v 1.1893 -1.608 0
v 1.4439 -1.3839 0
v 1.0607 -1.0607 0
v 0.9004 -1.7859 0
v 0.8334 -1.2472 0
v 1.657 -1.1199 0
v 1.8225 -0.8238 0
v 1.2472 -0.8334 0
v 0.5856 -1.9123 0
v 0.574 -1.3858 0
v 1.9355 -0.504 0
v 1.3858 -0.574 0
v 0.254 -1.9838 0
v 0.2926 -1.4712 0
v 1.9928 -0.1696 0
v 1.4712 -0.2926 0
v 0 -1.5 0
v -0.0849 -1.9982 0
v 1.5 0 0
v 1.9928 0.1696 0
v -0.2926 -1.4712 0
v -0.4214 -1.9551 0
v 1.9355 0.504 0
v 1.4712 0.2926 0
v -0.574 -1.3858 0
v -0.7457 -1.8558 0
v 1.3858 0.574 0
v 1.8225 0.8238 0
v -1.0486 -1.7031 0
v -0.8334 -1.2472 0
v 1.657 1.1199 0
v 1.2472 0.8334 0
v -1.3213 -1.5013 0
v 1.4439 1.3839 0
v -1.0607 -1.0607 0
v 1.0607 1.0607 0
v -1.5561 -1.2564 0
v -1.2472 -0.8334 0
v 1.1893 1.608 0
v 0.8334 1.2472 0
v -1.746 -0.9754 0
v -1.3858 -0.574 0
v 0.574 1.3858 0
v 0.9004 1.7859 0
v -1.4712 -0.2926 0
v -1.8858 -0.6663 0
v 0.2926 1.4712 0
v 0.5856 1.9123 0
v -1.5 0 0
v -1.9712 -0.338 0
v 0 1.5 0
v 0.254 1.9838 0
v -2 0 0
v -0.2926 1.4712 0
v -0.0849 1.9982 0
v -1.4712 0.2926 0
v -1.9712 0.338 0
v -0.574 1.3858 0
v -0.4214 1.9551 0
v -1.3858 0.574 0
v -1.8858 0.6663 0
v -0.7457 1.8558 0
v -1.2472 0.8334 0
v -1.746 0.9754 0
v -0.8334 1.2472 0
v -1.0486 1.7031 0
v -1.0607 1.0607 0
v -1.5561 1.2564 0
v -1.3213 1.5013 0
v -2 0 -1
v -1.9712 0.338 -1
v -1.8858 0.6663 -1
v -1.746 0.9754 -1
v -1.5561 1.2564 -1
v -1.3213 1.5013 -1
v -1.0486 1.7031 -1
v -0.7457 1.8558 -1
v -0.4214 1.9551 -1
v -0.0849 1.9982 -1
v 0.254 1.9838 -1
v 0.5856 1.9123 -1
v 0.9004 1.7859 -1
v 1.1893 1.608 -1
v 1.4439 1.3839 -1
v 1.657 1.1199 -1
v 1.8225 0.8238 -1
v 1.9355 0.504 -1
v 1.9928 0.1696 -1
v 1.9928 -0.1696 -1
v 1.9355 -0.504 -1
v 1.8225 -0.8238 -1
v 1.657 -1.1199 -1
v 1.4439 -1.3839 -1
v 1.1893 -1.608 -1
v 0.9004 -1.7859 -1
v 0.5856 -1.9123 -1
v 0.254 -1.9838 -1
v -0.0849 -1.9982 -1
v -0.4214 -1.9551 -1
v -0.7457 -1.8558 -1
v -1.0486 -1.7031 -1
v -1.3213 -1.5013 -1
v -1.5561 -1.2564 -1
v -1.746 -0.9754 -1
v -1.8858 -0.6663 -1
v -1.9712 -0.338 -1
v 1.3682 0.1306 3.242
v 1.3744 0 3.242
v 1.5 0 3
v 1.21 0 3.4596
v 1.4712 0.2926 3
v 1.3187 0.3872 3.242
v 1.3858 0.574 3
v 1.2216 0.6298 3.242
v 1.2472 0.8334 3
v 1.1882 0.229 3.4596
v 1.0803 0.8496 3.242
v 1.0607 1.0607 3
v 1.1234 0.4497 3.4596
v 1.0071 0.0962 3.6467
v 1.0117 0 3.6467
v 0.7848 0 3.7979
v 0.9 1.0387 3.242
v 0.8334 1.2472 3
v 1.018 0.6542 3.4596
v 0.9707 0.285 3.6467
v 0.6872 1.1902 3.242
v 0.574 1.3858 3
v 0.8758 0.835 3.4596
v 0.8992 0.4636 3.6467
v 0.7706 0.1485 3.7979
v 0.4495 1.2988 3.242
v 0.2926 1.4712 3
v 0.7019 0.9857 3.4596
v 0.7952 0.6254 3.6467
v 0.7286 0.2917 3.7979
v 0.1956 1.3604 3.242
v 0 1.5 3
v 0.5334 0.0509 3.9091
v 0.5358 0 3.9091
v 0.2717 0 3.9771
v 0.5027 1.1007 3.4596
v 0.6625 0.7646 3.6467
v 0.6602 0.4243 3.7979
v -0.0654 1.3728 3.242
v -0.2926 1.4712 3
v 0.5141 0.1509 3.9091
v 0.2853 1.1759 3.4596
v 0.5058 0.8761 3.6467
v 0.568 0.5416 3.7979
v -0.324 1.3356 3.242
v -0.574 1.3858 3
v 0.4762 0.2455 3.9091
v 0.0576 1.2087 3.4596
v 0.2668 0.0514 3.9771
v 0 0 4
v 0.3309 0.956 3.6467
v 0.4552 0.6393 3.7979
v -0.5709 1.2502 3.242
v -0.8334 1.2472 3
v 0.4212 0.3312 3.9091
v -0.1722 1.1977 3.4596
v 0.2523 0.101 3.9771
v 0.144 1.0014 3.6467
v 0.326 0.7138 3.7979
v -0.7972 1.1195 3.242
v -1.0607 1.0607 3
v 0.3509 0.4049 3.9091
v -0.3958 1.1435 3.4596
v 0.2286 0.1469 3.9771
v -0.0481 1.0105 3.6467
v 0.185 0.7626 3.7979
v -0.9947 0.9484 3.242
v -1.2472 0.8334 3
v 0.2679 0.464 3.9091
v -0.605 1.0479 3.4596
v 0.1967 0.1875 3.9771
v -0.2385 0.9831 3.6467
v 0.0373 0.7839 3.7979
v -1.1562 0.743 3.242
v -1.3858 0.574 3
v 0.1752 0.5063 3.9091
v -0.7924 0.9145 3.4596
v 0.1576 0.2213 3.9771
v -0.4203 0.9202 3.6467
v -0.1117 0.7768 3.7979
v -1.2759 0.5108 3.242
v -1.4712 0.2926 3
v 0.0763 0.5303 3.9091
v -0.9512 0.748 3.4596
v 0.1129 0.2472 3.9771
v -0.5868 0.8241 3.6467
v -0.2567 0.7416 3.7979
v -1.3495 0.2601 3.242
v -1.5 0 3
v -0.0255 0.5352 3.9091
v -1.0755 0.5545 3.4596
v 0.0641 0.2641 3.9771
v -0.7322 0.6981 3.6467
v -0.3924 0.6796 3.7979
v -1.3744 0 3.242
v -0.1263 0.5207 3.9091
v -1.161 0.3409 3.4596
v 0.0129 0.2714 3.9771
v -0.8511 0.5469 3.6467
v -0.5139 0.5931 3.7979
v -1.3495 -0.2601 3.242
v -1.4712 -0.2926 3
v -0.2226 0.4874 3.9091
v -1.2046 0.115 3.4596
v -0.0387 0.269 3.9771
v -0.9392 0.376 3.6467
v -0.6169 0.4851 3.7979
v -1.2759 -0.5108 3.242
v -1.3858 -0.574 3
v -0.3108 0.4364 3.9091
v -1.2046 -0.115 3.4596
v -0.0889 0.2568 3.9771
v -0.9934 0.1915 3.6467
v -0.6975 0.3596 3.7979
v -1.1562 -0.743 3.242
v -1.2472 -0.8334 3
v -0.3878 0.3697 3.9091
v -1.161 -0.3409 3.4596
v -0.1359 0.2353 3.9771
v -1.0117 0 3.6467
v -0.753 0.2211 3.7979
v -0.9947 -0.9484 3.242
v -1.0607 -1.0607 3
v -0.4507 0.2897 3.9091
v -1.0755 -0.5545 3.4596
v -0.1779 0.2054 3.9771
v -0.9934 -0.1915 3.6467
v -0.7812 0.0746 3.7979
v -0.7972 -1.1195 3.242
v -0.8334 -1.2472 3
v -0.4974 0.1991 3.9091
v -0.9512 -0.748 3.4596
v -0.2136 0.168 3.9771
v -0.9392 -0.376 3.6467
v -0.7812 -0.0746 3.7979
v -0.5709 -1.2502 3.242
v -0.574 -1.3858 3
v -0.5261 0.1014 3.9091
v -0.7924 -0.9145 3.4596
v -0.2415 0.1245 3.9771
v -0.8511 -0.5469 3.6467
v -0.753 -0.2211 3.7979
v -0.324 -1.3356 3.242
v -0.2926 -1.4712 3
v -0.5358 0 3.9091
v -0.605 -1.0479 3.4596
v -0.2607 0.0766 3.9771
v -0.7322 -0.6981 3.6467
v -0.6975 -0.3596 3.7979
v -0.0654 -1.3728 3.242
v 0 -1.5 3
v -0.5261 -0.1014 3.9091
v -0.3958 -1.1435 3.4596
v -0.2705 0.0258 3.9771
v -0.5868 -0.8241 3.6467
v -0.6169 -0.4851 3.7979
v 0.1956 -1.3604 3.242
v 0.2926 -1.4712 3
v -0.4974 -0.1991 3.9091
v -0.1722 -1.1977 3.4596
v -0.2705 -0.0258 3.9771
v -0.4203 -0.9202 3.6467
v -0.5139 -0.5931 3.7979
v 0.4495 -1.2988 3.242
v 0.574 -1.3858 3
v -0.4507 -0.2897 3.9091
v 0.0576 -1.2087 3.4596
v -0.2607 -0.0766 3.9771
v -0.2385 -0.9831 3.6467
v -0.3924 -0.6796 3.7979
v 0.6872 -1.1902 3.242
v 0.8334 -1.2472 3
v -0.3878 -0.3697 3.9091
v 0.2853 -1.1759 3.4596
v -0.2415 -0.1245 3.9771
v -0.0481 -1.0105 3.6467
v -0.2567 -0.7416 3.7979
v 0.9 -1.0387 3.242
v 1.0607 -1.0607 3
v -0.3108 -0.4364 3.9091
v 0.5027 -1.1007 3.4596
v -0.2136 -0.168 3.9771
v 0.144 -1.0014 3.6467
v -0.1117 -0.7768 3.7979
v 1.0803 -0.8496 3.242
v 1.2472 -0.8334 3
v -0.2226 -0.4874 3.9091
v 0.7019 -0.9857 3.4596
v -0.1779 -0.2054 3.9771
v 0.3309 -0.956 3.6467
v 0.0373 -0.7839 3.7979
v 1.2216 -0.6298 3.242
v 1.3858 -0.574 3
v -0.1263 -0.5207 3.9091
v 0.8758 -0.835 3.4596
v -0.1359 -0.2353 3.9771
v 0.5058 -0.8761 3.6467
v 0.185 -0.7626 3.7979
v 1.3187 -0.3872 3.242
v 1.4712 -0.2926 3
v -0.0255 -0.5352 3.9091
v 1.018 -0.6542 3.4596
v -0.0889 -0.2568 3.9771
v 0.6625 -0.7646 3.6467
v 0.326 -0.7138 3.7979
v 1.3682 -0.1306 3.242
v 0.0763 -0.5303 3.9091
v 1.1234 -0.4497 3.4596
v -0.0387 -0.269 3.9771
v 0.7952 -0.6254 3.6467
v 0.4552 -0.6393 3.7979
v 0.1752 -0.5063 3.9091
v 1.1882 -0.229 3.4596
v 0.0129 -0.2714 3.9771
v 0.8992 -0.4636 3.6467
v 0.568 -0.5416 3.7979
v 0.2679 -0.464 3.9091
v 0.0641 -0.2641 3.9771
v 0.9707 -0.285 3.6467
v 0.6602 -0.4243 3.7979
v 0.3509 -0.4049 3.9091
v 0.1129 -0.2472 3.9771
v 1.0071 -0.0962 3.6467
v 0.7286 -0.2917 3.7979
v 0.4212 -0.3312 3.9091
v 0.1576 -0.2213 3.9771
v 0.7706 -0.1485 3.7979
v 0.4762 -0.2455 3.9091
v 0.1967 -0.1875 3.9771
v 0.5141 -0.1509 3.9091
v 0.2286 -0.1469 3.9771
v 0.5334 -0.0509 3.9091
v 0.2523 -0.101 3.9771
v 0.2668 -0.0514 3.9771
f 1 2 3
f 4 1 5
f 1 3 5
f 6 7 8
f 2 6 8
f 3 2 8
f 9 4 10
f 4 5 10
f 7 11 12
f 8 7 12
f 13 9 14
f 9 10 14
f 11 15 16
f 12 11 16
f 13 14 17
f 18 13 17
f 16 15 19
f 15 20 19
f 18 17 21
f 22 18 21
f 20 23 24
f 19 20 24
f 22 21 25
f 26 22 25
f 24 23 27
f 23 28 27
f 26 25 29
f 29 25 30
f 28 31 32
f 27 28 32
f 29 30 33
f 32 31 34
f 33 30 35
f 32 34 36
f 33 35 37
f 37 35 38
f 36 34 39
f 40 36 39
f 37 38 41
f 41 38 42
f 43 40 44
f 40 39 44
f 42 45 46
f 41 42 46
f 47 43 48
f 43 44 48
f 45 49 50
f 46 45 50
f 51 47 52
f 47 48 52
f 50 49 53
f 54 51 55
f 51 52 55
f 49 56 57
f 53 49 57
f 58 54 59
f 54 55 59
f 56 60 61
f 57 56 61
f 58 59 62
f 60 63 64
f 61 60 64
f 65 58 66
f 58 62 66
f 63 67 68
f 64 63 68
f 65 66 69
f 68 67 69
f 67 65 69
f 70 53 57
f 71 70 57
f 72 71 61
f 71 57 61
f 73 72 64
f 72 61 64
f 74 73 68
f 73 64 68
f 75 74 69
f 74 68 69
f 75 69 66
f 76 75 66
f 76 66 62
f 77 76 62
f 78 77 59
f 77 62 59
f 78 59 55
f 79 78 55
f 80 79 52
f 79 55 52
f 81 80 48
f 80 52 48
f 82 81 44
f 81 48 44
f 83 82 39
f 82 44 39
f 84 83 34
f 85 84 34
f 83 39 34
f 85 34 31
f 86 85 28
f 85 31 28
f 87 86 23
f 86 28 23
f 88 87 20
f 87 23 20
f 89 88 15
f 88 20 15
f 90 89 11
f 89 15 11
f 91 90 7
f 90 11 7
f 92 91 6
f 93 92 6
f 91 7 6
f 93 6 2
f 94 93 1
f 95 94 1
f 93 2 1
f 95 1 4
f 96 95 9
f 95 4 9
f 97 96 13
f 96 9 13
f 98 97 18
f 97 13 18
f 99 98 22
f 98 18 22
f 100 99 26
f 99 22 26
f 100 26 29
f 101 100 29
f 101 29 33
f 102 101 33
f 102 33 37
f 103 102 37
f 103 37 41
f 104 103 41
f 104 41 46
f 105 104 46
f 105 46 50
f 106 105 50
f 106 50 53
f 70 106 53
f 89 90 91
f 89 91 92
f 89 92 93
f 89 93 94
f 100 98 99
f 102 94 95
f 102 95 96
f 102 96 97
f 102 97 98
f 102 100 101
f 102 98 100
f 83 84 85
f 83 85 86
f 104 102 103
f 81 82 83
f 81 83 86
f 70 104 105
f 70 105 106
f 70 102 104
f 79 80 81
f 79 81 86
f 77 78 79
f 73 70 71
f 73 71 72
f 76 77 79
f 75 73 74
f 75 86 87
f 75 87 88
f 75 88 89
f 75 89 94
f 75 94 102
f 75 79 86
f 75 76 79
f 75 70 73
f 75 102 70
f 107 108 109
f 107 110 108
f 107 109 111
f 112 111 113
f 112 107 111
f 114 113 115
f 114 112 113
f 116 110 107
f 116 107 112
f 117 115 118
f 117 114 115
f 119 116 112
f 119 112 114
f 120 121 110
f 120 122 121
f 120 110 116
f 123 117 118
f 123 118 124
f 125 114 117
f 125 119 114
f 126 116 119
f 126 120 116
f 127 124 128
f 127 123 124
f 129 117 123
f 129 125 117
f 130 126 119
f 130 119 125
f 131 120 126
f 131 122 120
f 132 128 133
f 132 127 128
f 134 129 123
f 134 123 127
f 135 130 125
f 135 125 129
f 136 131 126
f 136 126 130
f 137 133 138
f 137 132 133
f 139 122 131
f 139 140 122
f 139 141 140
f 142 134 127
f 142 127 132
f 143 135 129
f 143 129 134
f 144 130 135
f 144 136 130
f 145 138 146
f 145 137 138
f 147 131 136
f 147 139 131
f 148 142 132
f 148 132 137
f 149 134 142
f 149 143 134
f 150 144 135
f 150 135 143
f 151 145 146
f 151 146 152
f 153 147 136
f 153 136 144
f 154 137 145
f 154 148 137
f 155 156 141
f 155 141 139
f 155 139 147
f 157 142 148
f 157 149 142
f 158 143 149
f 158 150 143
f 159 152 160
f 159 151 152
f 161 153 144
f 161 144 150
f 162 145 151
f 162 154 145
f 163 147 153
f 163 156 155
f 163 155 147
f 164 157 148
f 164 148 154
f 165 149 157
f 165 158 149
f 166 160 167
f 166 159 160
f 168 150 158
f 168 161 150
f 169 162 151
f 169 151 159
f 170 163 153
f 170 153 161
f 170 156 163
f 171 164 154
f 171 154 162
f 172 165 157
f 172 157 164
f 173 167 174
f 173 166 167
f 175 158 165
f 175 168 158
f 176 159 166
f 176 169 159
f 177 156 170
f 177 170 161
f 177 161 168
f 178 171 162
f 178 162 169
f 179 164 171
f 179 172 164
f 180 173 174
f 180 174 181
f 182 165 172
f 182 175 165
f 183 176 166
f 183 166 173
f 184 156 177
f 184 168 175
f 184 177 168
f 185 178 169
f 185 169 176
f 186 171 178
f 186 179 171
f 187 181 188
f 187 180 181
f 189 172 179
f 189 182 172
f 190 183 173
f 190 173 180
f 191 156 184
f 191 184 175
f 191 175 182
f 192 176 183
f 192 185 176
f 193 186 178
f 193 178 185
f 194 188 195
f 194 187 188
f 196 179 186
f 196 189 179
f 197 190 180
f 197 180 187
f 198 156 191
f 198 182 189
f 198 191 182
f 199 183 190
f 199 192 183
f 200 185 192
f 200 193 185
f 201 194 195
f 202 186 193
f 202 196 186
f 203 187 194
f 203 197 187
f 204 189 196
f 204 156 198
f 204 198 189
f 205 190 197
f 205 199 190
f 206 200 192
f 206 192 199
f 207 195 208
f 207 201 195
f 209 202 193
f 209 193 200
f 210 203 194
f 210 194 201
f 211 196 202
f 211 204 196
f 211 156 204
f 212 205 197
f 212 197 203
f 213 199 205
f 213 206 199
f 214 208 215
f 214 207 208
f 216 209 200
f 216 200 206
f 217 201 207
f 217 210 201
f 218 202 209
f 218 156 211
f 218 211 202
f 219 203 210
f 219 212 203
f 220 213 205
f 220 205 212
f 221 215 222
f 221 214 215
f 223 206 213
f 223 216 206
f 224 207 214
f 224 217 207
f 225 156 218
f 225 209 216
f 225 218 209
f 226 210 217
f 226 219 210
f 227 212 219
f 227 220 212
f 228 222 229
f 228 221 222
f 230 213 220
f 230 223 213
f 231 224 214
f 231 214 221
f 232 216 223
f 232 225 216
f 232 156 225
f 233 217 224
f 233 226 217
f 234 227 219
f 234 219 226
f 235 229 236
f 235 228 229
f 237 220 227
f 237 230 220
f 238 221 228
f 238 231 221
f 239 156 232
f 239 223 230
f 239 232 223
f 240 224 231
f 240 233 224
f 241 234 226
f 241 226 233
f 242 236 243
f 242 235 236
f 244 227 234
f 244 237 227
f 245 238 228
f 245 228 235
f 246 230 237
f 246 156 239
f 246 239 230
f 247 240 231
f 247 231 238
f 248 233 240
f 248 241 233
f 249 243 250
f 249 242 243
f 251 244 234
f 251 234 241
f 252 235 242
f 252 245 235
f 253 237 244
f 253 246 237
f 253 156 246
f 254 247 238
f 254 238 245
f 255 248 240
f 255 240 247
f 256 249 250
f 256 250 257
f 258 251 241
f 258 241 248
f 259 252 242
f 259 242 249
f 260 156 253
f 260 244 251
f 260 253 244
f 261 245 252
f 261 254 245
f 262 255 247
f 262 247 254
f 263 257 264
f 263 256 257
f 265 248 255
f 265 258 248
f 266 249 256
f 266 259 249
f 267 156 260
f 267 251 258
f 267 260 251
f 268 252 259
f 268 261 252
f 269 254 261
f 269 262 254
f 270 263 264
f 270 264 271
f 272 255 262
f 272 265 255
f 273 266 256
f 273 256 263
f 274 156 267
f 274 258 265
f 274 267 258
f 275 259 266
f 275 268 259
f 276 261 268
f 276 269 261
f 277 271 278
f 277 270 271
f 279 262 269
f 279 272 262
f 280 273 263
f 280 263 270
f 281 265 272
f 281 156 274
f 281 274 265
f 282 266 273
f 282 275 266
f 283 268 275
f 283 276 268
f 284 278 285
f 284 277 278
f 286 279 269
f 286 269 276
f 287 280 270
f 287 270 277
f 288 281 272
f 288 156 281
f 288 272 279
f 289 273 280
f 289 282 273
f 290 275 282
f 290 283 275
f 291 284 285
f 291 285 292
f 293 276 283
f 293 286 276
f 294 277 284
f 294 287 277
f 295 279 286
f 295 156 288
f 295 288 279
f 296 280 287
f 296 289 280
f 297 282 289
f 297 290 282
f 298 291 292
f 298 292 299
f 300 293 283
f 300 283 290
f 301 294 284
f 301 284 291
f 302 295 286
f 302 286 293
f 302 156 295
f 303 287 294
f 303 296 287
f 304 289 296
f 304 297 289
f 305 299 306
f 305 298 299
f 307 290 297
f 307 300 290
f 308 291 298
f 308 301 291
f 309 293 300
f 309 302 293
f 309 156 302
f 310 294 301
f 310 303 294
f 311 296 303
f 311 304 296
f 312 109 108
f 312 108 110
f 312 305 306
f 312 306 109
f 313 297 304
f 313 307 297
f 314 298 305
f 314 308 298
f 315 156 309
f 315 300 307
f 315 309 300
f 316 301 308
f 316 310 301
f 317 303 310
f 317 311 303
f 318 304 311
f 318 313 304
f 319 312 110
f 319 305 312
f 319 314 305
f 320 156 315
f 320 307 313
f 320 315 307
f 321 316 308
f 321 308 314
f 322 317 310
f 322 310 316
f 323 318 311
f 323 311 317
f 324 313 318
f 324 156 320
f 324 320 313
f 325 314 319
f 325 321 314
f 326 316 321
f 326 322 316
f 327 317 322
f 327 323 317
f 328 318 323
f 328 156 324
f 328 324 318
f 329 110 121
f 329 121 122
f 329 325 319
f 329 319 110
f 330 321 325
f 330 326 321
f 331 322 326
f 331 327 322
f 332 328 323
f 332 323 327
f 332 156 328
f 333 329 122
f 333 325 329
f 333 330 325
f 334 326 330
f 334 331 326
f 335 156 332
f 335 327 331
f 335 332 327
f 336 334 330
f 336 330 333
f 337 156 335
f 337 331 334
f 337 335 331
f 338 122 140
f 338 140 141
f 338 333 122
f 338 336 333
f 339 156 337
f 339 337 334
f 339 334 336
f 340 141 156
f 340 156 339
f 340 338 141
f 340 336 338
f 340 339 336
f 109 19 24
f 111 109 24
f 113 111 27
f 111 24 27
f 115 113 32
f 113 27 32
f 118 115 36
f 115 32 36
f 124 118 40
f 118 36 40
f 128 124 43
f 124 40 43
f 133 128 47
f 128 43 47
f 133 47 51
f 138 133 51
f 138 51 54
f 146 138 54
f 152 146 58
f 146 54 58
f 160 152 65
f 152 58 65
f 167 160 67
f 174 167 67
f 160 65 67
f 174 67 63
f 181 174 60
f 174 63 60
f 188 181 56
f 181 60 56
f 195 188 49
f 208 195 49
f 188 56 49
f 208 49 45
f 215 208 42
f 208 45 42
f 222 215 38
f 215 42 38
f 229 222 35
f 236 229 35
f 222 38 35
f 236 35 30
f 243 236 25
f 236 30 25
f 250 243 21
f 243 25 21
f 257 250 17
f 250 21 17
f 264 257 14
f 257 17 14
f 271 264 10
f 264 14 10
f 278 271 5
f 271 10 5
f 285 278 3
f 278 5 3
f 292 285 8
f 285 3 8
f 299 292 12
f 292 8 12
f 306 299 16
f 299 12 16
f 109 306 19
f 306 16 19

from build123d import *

# Parameters (mm, degrees)
SKETCH_1_R         = 1.5
EXTRUDE_1_DEPTH    = 3
SKETCH_2_R         = 2
EXTRUDE_2_DEPTH    = 1
DOME_1_FACE_RADIUS = 1.5
DOME_1_HEIGHT      = 1


with BuildPart() as part:
    # 草图1 → 拉伸1 (new body)
    with BuildSketch(Plane.XY):
        Circle(SKETCH_1_R)
    extrude(amount=EXTRUDE_1_DEPTH)

    # 草图2 → 拉伸2 (add)
    with BuildSketch(Plane(origin=(0, 0, 0), x_dir=(-1, 0, 0), z_dir=(0, 0, -1))):
        Circle(SKETCH_2_R)
    extrude(amount=EXTRUDE_2_DEPTH)

    # 圆顶1: a dome of height H over a round flat face of radius A is a cap of a sphere of radius (A * A + H * H) / (2 * H)
    dome_1_r = (DOME_1_FACE_RADIUS * DOME_1_FACE_RADIUS + DOME_1_HEIGHT * DOME_1_HEIGHT) / (2 * DOME_1_HEIGHT)
    dome_1_base = Plane((0, 0, 3), z_dir=(0, 0, 1))
    with Locations(dome_1_base.offset(DOME_1_HEIGHT - dome_1_r)):
        dome_1_ball = Sphere(dome_1_r, mode=Mode.PRIVATE)
    add(split(dome_1_ball, bisect_by=dome_1_base, keep=Keep.TOP, mode=Mode.PRIVATE))


solid = part.part
